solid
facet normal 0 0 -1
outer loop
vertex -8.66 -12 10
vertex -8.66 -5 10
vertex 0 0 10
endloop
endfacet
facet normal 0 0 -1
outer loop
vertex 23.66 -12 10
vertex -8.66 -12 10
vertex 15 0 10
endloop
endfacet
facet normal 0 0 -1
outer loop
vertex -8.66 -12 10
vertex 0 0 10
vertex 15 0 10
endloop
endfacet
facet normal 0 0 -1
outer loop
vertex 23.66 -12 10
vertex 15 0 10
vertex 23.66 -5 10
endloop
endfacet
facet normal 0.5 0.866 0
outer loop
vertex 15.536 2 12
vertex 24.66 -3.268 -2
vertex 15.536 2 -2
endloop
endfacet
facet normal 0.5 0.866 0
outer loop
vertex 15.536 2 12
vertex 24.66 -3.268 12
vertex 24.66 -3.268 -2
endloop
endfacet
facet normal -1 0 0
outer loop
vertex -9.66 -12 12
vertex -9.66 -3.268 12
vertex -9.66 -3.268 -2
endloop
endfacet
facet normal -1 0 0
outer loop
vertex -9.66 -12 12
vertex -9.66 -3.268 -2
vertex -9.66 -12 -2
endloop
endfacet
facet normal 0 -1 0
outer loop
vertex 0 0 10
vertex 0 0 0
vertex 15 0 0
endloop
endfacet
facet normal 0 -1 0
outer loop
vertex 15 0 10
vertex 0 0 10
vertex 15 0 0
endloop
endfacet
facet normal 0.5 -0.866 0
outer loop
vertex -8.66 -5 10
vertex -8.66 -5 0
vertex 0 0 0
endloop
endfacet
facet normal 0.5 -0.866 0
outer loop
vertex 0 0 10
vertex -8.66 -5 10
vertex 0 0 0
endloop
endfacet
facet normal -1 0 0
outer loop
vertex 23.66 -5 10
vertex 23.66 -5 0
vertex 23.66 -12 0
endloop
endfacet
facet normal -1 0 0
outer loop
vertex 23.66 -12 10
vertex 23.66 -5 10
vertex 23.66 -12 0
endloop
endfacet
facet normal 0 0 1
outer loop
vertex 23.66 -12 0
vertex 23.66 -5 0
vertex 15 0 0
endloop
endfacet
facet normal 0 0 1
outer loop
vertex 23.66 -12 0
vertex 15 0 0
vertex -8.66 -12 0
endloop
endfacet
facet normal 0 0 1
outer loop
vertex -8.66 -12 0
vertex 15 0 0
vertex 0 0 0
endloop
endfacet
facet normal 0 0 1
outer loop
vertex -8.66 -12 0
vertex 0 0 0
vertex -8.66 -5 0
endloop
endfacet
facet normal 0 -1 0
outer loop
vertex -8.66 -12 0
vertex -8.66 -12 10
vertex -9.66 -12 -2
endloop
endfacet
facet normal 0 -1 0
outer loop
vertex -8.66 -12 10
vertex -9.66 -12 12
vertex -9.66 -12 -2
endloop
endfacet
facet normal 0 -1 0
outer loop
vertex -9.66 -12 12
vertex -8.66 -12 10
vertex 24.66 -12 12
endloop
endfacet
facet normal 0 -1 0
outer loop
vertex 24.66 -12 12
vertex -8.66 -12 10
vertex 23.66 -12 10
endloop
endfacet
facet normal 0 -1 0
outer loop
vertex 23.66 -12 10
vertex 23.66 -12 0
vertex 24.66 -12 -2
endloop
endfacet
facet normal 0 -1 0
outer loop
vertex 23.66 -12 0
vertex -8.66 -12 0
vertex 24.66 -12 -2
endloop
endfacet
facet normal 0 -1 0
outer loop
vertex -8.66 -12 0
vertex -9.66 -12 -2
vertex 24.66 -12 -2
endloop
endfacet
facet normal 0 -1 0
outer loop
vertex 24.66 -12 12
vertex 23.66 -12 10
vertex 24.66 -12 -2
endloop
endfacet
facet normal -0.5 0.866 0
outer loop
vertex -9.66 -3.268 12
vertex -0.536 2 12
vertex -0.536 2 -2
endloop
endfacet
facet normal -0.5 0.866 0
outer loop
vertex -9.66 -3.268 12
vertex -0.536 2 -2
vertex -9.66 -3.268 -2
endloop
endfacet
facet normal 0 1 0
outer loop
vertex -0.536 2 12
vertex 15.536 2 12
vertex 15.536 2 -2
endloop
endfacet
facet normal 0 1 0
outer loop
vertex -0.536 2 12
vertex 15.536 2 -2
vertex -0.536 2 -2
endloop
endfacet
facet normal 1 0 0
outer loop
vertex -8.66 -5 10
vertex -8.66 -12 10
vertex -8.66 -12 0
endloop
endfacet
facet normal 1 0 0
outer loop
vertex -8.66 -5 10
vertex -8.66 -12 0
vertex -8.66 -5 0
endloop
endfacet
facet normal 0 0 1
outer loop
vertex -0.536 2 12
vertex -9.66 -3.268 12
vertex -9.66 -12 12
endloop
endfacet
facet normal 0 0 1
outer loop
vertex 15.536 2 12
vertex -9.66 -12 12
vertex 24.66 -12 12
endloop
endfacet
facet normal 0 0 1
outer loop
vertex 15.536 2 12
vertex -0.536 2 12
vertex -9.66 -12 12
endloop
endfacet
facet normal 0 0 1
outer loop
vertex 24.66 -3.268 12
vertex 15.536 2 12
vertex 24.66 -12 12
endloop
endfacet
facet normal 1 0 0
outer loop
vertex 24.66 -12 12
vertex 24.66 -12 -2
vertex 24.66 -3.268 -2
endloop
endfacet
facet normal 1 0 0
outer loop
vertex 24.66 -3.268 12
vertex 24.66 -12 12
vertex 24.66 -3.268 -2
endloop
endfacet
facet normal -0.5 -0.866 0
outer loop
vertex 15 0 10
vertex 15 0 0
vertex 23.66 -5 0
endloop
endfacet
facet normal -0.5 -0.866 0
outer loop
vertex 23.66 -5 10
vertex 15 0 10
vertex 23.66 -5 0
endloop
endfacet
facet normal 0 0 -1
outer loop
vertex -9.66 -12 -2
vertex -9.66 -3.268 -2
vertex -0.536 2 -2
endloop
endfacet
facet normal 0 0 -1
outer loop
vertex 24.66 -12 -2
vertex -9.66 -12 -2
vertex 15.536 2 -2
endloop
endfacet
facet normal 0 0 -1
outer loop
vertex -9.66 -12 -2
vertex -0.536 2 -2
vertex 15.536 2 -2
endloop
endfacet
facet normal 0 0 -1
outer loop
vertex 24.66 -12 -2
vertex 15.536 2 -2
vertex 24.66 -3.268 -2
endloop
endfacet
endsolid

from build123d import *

# Parameters (mm, degrees)
BOSS_EXTRUDE1_DEPTH  = 10
BOSS_EXTRUDE2_DEPTH  = 2
BOSS_EXTRUDE3_DEPTH  = 2
SKETCH4_W            = 32.320508076
SKETCH4_H            = 7
BOSS_EXTRUDE4_DEPTH  = 2
SKETCH5_W            = 32.320508076
SKETCH5_H            = 7
BOSS_EXTRUDE5_DEPTH  = 2
BOSS_EXTRUDE9_DEPTH  = 14
BOSS_EXTRUDE10_DEPTH = 14


with BuildPart() as part:
    # Sketch1 → Boss-Extrude1 (new body)
    with BuildSketch(Plane.XY):
        Polygon((15, 0), (23.660254038, -5), (24.660254038, -3.267949192), (15.535898385, 2), (-0.535898385, 2), (-9.660254038, -3.267949192), (-8.660254038, -5), (0, 0), align=None)
    extrude(amount=BOSS_EXTRUDE1_DEPTH)

    # Sketch2 → Boss-Extrude2 (add)
    with BuildSketch(Plane.XY.offset(10)):
        Polygon((-8.660254038, -5), (23.660254038, -5), (15, 0), (0, 0), align=None)
        Polygon((23.660254038, -5), (24.660254038, -3.267949192), (15.535898385, 2), (-0.535898385, 2), (-9.660254038, -3.267949192), (-8.660254038, -5), (0, 0), (15, 0), align=None)
    extrude(amount=BOSS_EXTRUDE2_DEPTH)

    # Sketch3 → Boss-Extrude3 (add)
    with BuildSketch(Plane(origin=(0, 0, 0), x_dir=(-1, 0, 0), z_dir=(0, 0, -1))):
        Polygon((-24.660254038, -3.267949192), (-15.535898385, 2), (0.535898385, 2), (9.660254038, -3.267949192), (8.660254038, -5), (-23.660254038, -5), align=None)
    extrude(amount=BOSS_EXTRUDE3_DEPTH)

    # Sketch4 → Boss-Extrude4 (add)
    with BuildSketch(Plane.XY.offset(12)):
        with Locations((7.5, -8.5)):
            Rectangle(SKETCH4_W, SKETCH4_H)
    extrude(amount=-BOSS_EXTRUDE4_DEPTH)

    # Sketch5 → Boss-Extrude5 (add)
    with BuildSketch(Plane(origin=(0, 0, -2), x_dir=(-1, 0, 0), z_dir=(0, 0, -1))):
        with Locations((-7.5, -8.5)):
            Rectangle(SKETCH5_W, SKETCH5_H)
    extrude(amount=-BOSS_EXTRUDE5_DEPTH)

    # Sketch8 → Boss-Extrude9 (add)
    with BuildSketch(Plane.XY.offset(12)):
        Polygon((-9.660254038, -3.267949192), (-9.660254038, -12), (-8.660254038, -12), (-8.660254038, -5), align=None)
    extrude(amount=-BOSS_EXTRUDE9_DEPTH)

    # Sketch9 → Boss-Extrude10 (add)
    with BuildSketch(Plane(origin=(0, 0, -2), x_dir=(-1, 0, 0), z_dir=(0, 0, -1))):
        Polygon((-24.660254038, -3.267949192), (-23.660254038, -5), (-23.660254038, -12), (-24.660254038, -12), align=None)
    extrude(amount=-BOSS_EXTRUDE10_DEPTH)


solid = part.part
